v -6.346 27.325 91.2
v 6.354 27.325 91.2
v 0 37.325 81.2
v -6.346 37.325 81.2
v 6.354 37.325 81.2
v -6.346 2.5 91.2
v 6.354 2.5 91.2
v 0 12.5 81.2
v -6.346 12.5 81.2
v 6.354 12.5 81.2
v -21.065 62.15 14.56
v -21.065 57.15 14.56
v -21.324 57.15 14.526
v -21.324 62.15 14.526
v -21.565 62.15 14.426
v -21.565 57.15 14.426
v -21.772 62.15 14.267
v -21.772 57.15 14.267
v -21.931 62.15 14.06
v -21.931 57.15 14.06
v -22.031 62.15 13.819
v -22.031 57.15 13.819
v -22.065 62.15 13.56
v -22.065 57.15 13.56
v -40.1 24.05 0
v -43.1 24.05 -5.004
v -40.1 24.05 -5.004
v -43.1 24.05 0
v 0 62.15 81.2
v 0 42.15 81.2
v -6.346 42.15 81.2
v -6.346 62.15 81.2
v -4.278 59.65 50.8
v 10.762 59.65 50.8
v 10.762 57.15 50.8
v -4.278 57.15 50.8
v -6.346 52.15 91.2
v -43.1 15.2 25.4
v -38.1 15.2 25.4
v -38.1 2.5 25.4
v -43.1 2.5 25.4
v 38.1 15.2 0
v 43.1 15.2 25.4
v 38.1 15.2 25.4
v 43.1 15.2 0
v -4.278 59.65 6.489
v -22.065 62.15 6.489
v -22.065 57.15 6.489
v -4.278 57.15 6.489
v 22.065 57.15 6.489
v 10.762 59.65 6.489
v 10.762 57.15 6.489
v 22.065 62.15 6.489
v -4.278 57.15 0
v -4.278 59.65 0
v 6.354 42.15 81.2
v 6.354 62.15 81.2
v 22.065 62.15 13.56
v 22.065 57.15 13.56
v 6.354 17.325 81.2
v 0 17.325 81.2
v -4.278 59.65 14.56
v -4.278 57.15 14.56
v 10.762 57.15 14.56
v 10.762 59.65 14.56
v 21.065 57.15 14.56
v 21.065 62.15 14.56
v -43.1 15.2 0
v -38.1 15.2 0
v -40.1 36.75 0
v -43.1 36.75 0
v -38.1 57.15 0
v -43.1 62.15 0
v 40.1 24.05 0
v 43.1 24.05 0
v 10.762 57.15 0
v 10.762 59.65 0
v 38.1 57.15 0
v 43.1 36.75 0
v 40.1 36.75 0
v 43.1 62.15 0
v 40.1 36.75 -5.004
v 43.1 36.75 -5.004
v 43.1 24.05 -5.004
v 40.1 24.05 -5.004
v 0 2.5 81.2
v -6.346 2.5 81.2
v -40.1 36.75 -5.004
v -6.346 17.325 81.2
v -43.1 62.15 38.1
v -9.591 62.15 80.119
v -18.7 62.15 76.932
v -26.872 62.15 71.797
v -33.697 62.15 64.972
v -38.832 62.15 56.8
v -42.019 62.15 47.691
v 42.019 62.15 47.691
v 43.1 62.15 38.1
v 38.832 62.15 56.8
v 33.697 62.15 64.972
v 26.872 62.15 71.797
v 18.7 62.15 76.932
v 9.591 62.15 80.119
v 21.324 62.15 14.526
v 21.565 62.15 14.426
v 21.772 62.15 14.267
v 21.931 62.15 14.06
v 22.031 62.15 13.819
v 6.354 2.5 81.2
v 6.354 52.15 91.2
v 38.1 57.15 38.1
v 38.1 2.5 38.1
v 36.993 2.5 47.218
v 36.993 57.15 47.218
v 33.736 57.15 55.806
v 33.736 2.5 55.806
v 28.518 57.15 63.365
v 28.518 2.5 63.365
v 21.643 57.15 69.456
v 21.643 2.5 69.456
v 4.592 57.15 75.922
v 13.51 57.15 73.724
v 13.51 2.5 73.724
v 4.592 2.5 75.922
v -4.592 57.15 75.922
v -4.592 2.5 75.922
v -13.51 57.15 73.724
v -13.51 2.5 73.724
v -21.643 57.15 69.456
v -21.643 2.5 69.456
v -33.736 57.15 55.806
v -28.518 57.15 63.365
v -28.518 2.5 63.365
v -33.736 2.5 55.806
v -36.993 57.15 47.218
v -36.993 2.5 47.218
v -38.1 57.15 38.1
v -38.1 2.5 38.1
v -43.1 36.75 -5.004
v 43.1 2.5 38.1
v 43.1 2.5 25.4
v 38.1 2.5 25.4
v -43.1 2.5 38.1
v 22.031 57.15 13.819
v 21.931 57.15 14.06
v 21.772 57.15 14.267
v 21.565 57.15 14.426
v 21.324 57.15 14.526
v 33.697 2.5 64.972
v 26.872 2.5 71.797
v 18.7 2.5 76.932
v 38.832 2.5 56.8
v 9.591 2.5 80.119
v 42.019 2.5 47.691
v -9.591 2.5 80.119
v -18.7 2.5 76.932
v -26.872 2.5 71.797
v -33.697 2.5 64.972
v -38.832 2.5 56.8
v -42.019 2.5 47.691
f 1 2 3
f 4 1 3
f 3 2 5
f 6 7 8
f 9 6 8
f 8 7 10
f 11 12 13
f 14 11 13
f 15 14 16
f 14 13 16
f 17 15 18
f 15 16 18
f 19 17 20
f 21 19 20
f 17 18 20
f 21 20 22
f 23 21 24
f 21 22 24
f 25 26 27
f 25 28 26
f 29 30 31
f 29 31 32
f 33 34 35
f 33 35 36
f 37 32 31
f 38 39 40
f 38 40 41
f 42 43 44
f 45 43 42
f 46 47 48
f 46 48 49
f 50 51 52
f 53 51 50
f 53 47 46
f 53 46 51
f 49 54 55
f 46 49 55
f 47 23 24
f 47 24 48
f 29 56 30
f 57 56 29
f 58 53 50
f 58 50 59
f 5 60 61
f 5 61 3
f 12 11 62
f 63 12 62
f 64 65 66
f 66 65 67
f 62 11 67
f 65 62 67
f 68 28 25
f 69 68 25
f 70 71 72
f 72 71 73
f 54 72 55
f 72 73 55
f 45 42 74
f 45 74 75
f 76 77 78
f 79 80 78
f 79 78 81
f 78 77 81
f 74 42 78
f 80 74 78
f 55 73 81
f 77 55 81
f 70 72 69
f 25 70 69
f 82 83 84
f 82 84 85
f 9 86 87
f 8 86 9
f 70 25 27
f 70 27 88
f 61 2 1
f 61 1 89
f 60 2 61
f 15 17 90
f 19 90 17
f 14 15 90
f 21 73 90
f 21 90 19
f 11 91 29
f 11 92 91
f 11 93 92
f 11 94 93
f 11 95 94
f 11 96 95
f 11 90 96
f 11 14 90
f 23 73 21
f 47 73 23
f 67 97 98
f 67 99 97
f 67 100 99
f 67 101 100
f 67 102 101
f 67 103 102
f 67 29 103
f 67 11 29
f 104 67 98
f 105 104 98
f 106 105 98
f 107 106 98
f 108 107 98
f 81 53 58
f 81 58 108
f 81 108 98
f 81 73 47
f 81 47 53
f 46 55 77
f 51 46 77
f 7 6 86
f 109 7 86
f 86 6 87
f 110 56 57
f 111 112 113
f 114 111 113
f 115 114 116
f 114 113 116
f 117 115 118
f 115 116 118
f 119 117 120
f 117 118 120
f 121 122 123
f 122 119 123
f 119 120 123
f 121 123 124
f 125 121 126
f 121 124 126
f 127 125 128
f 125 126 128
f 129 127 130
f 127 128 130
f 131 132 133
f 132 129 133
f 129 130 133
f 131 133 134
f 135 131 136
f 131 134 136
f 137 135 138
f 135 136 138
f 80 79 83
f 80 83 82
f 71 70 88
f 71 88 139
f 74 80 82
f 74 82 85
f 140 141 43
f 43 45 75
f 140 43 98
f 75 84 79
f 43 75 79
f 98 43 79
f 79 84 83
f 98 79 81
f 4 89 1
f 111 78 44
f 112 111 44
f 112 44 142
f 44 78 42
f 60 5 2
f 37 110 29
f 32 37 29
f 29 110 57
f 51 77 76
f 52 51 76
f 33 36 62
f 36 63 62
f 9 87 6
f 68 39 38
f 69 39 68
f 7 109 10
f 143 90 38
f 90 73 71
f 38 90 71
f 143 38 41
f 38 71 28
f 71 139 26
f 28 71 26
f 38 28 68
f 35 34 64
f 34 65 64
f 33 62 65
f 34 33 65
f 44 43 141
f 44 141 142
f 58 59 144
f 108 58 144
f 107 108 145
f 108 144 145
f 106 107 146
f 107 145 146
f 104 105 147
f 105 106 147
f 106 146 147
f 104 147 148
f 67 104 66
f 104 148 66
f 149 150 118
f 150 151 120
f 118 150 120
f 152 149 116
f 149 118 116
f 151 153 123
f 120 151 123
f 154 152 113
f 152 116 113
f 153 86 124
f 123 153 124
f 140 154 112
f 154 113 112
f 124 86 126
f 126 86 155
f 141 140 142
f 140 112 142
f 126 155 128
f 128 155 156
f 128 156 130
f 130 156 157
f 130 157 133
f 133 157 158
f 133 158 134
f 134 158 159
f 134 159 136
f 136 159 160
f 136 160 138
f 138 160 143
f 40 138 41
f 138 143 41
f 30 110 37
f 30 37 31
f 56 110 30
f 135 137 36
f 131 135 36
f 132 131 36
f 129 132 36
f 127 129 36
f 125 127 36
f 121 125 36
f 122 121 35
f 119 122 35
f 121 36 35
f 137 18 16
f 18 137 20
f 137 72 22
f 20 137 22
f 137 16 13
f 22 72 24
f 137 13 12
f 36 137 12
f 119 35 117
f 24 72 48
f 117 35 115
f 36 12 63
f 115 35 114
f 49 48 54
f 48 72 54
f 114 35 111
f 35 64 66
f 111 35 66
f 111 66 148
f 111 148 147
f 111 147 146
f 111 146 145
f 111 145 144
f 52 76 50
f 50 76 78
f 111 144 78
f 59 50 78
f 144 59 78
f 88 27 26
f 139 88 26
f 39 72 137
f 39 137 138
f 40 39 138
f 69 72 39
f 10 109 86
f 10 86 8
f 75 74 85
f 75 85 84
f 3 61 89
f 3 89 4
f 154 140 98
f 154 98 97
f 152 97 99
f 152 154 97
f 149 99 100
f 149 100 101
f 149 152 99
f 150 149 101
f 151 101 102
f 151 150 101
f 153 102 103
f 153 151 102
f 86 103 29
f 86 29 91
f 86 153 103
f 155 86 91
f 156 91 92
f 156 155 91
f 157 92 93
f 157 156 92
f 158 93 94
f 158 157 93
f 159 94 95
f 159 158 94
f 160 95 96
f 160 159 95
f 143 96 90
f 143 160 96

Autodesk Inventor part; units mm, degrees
ref_plane "YZ Plane" through (0, 0, 0) normal (1, 0, 0) x (0, 1, 0)
ref_plane "XZ Plane" through (0, 0, 0) normal (0, 1, 0) x (-1, 0, 0)
sketch "Sketch1" plane through (0, 0, 0) normal (0, 0, 1) x (1, 0, 0)
  arc A0 (-38.1, -57.15) -> (38.1, -57.15) centre (0, -57.15) ccw projected
  line L0 (38.1, -57.15) -> (43.1, -57.15) projected
  line L1 (43.1, -57.15) -> (43.1, 62.15) projected
  line L2 (43.1, 62.15) -> (-43.1, 62.15) projected
  line L3 (-43.1, 62.15) -> (-43.1, -57.15) projected
  line L4 (-43.1, -57.15) -> (-38.1, -57.15) projected
  line L5 (14, 57.15) -> (-14, 57.15) projected
  line L6 (14, 57.15) -> (14, 54.15) projected
  line L7 (14, 54.15) -> (-10.002, 54.15) projected
  line L8 (-10.002, 54.15) -> (-10.002, 53.078) projected
  line L9 (-10.002, 53.078) -> (-14, 53.078) projected
  line L10 (-14, 53.078) -> (-14, 57.15) projected
  line L11 (10.16, -7.55) -> (-10.16, -7.55) projected
  line L12 (-10.16, -7.55) -> (-10.16, 9.15) projected
  line L13 (-10.16, 9.15) -> (10.16, 9.15) projected
  line L14 (10.16, 9.15) -> (10.16, -7.55) projected
  circle A1 centre (0, -77.15) radius 5 projected
  line L15 (-19.058, -20.782) -> (-19.058, -16.21) projected
  line L16 (-19.058, -16.21) -> (-17.058, -16.21) projected
  line L17 (-17.058, -16.21) -> (-17.058, -22.782) projected
  line L18 (-17.058, -22.782) -> (-24.598, -22.782) projected
  line L19 (-24.598, -22.782) -> (-24.598, -16.21) projected
  line L20 (-24.598, -16.21) -> (-22.598, -16.21) projected
  line L21 (-22.598, -16.21) -> (-22.598, -20.782) projected
  line L22 (-22.598, -20.782) -> (-19.058, -20.782) projected
  line L23 (-19.058, 7.65) -> (-19.058, 12.222) projected
  line L24 (-19.058, 12.222) -> (-22.598, 12.222) projected
  line L25 (-22.598, 12.222) -> (-22.598, 7.65) projected
  line L26 (-22.598, 7.65) -> (-24.598, 7.65) projected
  line L27 (-24.598, 7.65) -> (-24.598, 14.222) projected
  line L28 (-24.598, 14.222) -> (-17.058, 14.222) projected
  line L29 (-17.058, 14.222) -> (-17.058, 7.65) projected
  line L30 (-17.058, 7.65) -> (-19.058, 7.65) projected
  line L31 (-6.662, 29.218) -> (-6.662, 22.4) projected
  line L32 (-6.662, 22.4) -> (7.275, 22.4) projected
  line L33 (7.275, 22.4) -> (7.275, 19.4) projected
  line L34 (7.275, 19.4) -> (-14.202, 19.4) projected
  line L35 (-14.202, 19.4) -> (-14.202, 29.218) projected
  line L36 (-14.202, 29.218) -> (-12.202, 29.218) projected
  line L37 (-12.202, 29.218) -> (-12.202, 29.221) projected
  line L38 (-12.202, 29.221) -> (-8.662, 29.221) projected
  line L39 (-8.662, 29.221) -> (-8.662, 29.218) projected
  line L40 (-8.662, 29.218) -> (-6.662, 29.218) projected
  line L41 (38.1, -57.15) -> (43.1, -57.15)
  line L42 (43.1, -57.15) -> (43.1, 62.15)
  line L43 (43.1, 62.15) -> (38.1, 62.15)
  line L44 (38.1, 62.15) -> (38.1, -57.15)
  line L45 (-38.1, -57.15) -> (-43.1, -57.15)
  line L46 (-43.1, -57.15) -> (-43.1, 62.15)
  line L47 (-43.1, 62.15) -> (-38.1, 62.15)
  line L48 (-38.1, 62.15) -> (-38.1, -57.15)
  line L49 (-43.1, 62.15) -> (-43.1, 57.15)
  line L50 (-43.1, 57.15) -> (43.1, 57.15)
  line L51 (43.1, 57.15) -> (-43.1, 57.15)
  line L52 (-43.1, 57.15) -> (-43.1, 62.15)
  line L53 (-43.1, 62.15) -> (43.1, 62.15)
  line L54 (43.1, 62.15) -> (43.1, 57.15)
  point P0 (0, 0)
  dimension "d0" = 5
extrude "Extrusion1" add sketch "Sketch1" along normal blind 38.1 contours L4 L3 L50 L48 | L44 L50 L1 L0 | L50 L3 L2 L48 | L48 L2 L44 L50 L5 | L44 L2 L1 L50
sketch "Sketch2" plane through (-43.1, -57.15, 0) normal (0, -1, 0) x (1, 0, 0)
  line L0 (5, 38.1) -> (81.2, 38.1) projected
  arc A0 (81.2, 38.1) -> (5, 38.1) centre (43.1, 38.1) ccw
  line L1 (0, 38.1) -> (5, 38.1) projected
  arc A1 (86.2, 38.1) -> (0, 38.1) centre (43.1, 38.1) ccw
  line L2 (0, 38.1) -> (5, 38.1)
  line L3 (81.2, 38.1) -> (86.2, 38.1) projected
  line L4 (81.2, 38.1) -> (86.2, 38.1)
  point P0 (43.1, 0)
extrude "Extrusion2" add sketch "Sketch2" against normal blind 119.3 contours L1 A1 L3 A0
sketch "Sketch3" plane through (-43.1, 62.15, 0) normal (0, 1, 0) x (1, 0, 0)
  arc A0 (5, -38.1) -> (81.2, -38.1) centre (43.1, -38.1) ccw projected
  line L0 (81.2, -38.1) -> (5, -38.1) projected
  point P0 (43.1, 0)
extrude "Extrusion3" add sketch "Sketch3" against normal blind 5
ref_plane "Work Plane1" through (0.0038, -57.15, 0) normal (-1, 0, 0) x (0, 0, 1)
sketch "Sketch5" plane through (0.0038, -57.15, 0) normal (-1, 0, 0) x (0, 0, 1)
  point P0 (0, 57.15)
sketch "Sketch6" plane through (0.0038, -57.15, 0) normal (-1, 0, 0) x (0, 0, 1)
  line L0 (81.2, 0) -> (81.2, 119.3) projected
  line L1 (81.2, 119.3) -> (81.2, 99.3)
  line L2 (81.2, 109.3) -> (91.2, 109.3)
  line L3 (91.2, 109.3) -> (81.2, 119.3)
  line L4 (91.2, 109.3) -> (81.2, 99.3)
  line L5 (91.2, 84.475) -> (81.2, 74.475)
  line L6 (81.2, 84.475) -> (91.2, 84.475)
  line L7 (81.2, 94.475) -> (81.2, 74.475)
  line L8 (91.2, 84.475) -> (81.2, 94.475)
  line L9 (91.2, 59.65) -> (81.2, 49.65)
  line L10 (81.2, 59.65) -> (91.2, 59.65)
  line L11 (81.2, 69.65) -> (81.2, 49.65)
  line L12 (91.2, 59.65) -> (81.2, 69.65)
  line L13 (91.2, 34.825) -> (81.2, 24.825)
  line L14 (81.2, 34.825) -> (91.2, 34.825)
  line L15 (81.2, 44.825) -> (81.2, 24.825)
  line L16 (91.2, 34.825) -> (81.2, 44.825)
  line L17 (91.2, 10) -> (81.2, 0)
  line L18 (81.2, 10) -> (91.2, 10)
  line L19 (81.2, 20) -> (81.2, 0)
  line L20 (91.2, 10) -> (81.2, 20)
  point P0 (0, 57.15)
  dimension "d10" = 20
  dimension "d11" = 10
  dimension "d14" = 24.825
extrude "Extrusion5" add sketch "Sketch6" along normal mid plane 12.7
sketch "Sketch8" plane through (0, 0, 0) normal (0, 0, -1) x (-1, 0, 0)
  line L0 (40.1, 24.05) -> (40.1, 36.75) projected
  line L1 (-40.1, 36.75) -> (-40.1, 24.05) projected
  line L2 (-40.1, -19.05) -> (-40.1, -31.75) projected
  line L3 (43.1, 62.15) -> (43.1, -57.15) projected
  line L4 (40.1, 36.75) -> (43.1, 36.75)
  line L5 (43.1, 36.75) -> (43.1, 24.05)
  line L6 (43.1, 24.05) -> (40.1, 24.05)
  line L7 (40.1, 24.05) -> (40.1, 36.75)
  line L8 (40.1, -31.75) -> (40.1, -19.05)
  line L9 (-43.1, -57.15) -> (-43.1, 62.15) projected
  line L10 (-40.1, 24.05) -> (-43.1, 24.05)
  line L11 (-43.1, 24.05) -> (-43.1, 36.75)
  line L12 (-43.1, 36.75) -> (-40.1, 36.75)
  line L13 (-40.1, 36.75) -> (-40.1, 24.05)
  line L14 (40.1028, -54.85) -> (40.1028, -42.15) projected
  line L15 (-40.1028, -42.15) -> (-40.1028, -54.85) projected
  line L16 (-43.1, -54.85) -> (-40.1028, -54.85)
  line L17 (-40.1028, -54.85) -> (-40.1028, -42.15)
  line L18 (-40.1028, -42.15) -> (-43.1, -42.15)
  line L19 (-43.1, -42.15) -> (-43.1, -54.85)
  line L20 (43.1, 62.15) -> (43.1, -57.15) projected
  line L21 (40.1028, -54.85) -> (43.1, -54.85)
  line L22 (43.1, -54.85) -> (43.1, -42.15)
  line L23 (43.1, -42.15) -> (40.1028, -42.15)
  line L24 (40.1028, -42.15) -> (40.1028, -54.85)
  point P0 (0, 0)
  point P1 (43.1, -31.75)
  point P2 (-43.1, -31.75)
extrude "Extrusion6" add sketch "Sketch8" along normal blind 5.0038
sketch "Sketch9" plane through (0, 0, 0) normal (0, 0, -1) x (-1, 0, 0)
  line L0 (4.278, 59.65) -> (-6.35, 59.65) projected
  line L1 (38.1, 57.15) -> (-38.1, 57.15) projected
  line L2 (4.278, 59.65) -> (-6.35, 59.65)
  line L3 (-6.35, 59.65) -> (-6.35, 57.15)
  line L4 (-6.35, 57.15) -> (4.278, 57.15)
  line L5 (4.278, 57.15) -> (4.278, 59.65)
  point P0 (0, 0)
extrude "Extrusion7" cut sketch "Sketch9" against normal blind 50.8
sketch "Sketch10" plane through (0, 0, 0) normal (0, 0, -1) x (-1, 0, 0)
  line L0 (-6.35, 57.15) -> (-38.1, 57.15) projected
  line L1 (-10.762, 59.65) -> (-10.762, 22.646) projected
  line L2 (-10.762, 57.15) -> (-6.35, 57.15)
  line L3 (-6.35, 57.15) -> (-6.35, 59.65)
  line L4 (-6.35, 59.65) -> (-10.762, 59.65)
  line L5 (-10.762, 59.65) -> (-10.762, 57.15)
  point P0 (0, 0)
extrude "Extrusion8" cut sketch "Sketch10" against normal blind 50.8
sketch "Sketch11" plane through (-43.1, -57.15, 38.1) normal (-1, 0, 0) x (0, 0, 1)
  line L0 (53.1, 59.65) -> (43.1, 49.65) projected
  line L1 (53.1, 59.65) -> (-73.8859, 59.65)
  line L2 (-73.8859, 59.65) -> (-96.8429, -128.7567)
  line L3 (-96.8429, -128.7567) -> (99.8671, -85.0934)
  line L4 (99.8671, -85.0934) -> (53.1, 59.65)
  point P0 (-38.1, 57.15)
extrude "Extrusion9" cut sketch "Sketch11" against normal blind 406.4
sketch "Sketch12" plane through (43.1, 62.15, 38.1) normal (1, 0, 0) x (0, 0, -1)
  line L0 (38.1, -59.65) -> (0, -59.65) projected
  line L1 (38.1, -59.65) -> (0, -59.65)
  line L2 (0, -59.65) -> (0, -46.95)
  line L3 (0, -46.95) -> (38.1, -46.95)
  line L4 (38.1, -46.95) -> (38.1, -59.65)
  point P0 (38.1, -62.15)
  dimension "d29" = 12.7
extrude "Extrusion10" cut sketch "Sketch12" against normal blind 11049
sketch "Sketch13" plane through (43.1, 15.2, 38.1) normal (0, 0, -1) x (-1, 0, 0)
  line L0 (43.1, -12.7) -> (43.1, -2.7) projected
  line L1 (5, 0) -> (5, -12.7) projected
  line L2 (0, 0) -> (5, 0) projected
  line L3 (0, -12.7) -> (0, 0) projected
  line L4 (5, -12.7) -> (0, -12.7) projected
  line L5 (81.2, -12.7) -> (81.2, 0) projected
  line L6 (86.2, -12.7) -> (81.2, -12.7) projected
  line L7 (86.2, 0) -> (86.2, -12.7) projected
  line L8 (81.2, 0) -> (86.2, 0) projected
  point P0 (43.1, -15.2)
extrude "Extrusion11" add sketch "Sketch13" along normal blind 12.7
sketch "Sketch14" plane through (-43.1, 62.15, 0) normal (0, 1, 0) x (1, 0, 0)
  line L0 (31.035, -12.5599) -> (55.165, -12.5599) projected
  line L1 (55.165, -8.4959) -> (31.035, -8.4959) projected
  line L2 (55.165, -12.5599) -> (55.165, -14.5599)
  line L3 (55.165, -14.5599) -> (65.165, -14.5599)
  line L4 (31.035, -8.4959) -> (21.035, -8.4959)
  line L5 (86.2, 0) -> (0, 0) projected
  line L6 (65.165, -14.5599) -> (26.035, -14.5599)
  line L7 (26.035, 0) -> (65.165, 0)
  line L8 (65.165, 0) -> (65.165, -14.5599)
  line L9 (65.165, -14.5599) -> (21.035, -14.5599)
  line L10 (21.035, -14.5599) -> (21.035, 0)
  line L11 (21.035, 0) -> (65.165, 0)
  line L12 (65.165, 0) -> (65.165, -14.5599)
  line L13 (65.165, 0) -> (21.035, 0)
  line L14 (21.035, 0) -> (21.035, -6.4893)
  line L15 (21.035, -6.4893) -> (65.165, -6.4893)
  line L16 (65.165, -6.4893) -> (65.165, 0)
  point P0 (43.1, 0)
  dimension "d34" = 2
  dimension "d35" = 10
  dimension "d36" = 10
  dimension "d40" = 2.0066
extrude "Extrusion12" cut sketch "Sketch14" against normal blind 25.4 contours L6 L9 L10 L15 L8 L3
fillet "Fillet1" radius 1 2 edges at (22.065, 59.65, 14.5599) (-22.065, 59.65, 14.5599)
properties part number "Skin4"
